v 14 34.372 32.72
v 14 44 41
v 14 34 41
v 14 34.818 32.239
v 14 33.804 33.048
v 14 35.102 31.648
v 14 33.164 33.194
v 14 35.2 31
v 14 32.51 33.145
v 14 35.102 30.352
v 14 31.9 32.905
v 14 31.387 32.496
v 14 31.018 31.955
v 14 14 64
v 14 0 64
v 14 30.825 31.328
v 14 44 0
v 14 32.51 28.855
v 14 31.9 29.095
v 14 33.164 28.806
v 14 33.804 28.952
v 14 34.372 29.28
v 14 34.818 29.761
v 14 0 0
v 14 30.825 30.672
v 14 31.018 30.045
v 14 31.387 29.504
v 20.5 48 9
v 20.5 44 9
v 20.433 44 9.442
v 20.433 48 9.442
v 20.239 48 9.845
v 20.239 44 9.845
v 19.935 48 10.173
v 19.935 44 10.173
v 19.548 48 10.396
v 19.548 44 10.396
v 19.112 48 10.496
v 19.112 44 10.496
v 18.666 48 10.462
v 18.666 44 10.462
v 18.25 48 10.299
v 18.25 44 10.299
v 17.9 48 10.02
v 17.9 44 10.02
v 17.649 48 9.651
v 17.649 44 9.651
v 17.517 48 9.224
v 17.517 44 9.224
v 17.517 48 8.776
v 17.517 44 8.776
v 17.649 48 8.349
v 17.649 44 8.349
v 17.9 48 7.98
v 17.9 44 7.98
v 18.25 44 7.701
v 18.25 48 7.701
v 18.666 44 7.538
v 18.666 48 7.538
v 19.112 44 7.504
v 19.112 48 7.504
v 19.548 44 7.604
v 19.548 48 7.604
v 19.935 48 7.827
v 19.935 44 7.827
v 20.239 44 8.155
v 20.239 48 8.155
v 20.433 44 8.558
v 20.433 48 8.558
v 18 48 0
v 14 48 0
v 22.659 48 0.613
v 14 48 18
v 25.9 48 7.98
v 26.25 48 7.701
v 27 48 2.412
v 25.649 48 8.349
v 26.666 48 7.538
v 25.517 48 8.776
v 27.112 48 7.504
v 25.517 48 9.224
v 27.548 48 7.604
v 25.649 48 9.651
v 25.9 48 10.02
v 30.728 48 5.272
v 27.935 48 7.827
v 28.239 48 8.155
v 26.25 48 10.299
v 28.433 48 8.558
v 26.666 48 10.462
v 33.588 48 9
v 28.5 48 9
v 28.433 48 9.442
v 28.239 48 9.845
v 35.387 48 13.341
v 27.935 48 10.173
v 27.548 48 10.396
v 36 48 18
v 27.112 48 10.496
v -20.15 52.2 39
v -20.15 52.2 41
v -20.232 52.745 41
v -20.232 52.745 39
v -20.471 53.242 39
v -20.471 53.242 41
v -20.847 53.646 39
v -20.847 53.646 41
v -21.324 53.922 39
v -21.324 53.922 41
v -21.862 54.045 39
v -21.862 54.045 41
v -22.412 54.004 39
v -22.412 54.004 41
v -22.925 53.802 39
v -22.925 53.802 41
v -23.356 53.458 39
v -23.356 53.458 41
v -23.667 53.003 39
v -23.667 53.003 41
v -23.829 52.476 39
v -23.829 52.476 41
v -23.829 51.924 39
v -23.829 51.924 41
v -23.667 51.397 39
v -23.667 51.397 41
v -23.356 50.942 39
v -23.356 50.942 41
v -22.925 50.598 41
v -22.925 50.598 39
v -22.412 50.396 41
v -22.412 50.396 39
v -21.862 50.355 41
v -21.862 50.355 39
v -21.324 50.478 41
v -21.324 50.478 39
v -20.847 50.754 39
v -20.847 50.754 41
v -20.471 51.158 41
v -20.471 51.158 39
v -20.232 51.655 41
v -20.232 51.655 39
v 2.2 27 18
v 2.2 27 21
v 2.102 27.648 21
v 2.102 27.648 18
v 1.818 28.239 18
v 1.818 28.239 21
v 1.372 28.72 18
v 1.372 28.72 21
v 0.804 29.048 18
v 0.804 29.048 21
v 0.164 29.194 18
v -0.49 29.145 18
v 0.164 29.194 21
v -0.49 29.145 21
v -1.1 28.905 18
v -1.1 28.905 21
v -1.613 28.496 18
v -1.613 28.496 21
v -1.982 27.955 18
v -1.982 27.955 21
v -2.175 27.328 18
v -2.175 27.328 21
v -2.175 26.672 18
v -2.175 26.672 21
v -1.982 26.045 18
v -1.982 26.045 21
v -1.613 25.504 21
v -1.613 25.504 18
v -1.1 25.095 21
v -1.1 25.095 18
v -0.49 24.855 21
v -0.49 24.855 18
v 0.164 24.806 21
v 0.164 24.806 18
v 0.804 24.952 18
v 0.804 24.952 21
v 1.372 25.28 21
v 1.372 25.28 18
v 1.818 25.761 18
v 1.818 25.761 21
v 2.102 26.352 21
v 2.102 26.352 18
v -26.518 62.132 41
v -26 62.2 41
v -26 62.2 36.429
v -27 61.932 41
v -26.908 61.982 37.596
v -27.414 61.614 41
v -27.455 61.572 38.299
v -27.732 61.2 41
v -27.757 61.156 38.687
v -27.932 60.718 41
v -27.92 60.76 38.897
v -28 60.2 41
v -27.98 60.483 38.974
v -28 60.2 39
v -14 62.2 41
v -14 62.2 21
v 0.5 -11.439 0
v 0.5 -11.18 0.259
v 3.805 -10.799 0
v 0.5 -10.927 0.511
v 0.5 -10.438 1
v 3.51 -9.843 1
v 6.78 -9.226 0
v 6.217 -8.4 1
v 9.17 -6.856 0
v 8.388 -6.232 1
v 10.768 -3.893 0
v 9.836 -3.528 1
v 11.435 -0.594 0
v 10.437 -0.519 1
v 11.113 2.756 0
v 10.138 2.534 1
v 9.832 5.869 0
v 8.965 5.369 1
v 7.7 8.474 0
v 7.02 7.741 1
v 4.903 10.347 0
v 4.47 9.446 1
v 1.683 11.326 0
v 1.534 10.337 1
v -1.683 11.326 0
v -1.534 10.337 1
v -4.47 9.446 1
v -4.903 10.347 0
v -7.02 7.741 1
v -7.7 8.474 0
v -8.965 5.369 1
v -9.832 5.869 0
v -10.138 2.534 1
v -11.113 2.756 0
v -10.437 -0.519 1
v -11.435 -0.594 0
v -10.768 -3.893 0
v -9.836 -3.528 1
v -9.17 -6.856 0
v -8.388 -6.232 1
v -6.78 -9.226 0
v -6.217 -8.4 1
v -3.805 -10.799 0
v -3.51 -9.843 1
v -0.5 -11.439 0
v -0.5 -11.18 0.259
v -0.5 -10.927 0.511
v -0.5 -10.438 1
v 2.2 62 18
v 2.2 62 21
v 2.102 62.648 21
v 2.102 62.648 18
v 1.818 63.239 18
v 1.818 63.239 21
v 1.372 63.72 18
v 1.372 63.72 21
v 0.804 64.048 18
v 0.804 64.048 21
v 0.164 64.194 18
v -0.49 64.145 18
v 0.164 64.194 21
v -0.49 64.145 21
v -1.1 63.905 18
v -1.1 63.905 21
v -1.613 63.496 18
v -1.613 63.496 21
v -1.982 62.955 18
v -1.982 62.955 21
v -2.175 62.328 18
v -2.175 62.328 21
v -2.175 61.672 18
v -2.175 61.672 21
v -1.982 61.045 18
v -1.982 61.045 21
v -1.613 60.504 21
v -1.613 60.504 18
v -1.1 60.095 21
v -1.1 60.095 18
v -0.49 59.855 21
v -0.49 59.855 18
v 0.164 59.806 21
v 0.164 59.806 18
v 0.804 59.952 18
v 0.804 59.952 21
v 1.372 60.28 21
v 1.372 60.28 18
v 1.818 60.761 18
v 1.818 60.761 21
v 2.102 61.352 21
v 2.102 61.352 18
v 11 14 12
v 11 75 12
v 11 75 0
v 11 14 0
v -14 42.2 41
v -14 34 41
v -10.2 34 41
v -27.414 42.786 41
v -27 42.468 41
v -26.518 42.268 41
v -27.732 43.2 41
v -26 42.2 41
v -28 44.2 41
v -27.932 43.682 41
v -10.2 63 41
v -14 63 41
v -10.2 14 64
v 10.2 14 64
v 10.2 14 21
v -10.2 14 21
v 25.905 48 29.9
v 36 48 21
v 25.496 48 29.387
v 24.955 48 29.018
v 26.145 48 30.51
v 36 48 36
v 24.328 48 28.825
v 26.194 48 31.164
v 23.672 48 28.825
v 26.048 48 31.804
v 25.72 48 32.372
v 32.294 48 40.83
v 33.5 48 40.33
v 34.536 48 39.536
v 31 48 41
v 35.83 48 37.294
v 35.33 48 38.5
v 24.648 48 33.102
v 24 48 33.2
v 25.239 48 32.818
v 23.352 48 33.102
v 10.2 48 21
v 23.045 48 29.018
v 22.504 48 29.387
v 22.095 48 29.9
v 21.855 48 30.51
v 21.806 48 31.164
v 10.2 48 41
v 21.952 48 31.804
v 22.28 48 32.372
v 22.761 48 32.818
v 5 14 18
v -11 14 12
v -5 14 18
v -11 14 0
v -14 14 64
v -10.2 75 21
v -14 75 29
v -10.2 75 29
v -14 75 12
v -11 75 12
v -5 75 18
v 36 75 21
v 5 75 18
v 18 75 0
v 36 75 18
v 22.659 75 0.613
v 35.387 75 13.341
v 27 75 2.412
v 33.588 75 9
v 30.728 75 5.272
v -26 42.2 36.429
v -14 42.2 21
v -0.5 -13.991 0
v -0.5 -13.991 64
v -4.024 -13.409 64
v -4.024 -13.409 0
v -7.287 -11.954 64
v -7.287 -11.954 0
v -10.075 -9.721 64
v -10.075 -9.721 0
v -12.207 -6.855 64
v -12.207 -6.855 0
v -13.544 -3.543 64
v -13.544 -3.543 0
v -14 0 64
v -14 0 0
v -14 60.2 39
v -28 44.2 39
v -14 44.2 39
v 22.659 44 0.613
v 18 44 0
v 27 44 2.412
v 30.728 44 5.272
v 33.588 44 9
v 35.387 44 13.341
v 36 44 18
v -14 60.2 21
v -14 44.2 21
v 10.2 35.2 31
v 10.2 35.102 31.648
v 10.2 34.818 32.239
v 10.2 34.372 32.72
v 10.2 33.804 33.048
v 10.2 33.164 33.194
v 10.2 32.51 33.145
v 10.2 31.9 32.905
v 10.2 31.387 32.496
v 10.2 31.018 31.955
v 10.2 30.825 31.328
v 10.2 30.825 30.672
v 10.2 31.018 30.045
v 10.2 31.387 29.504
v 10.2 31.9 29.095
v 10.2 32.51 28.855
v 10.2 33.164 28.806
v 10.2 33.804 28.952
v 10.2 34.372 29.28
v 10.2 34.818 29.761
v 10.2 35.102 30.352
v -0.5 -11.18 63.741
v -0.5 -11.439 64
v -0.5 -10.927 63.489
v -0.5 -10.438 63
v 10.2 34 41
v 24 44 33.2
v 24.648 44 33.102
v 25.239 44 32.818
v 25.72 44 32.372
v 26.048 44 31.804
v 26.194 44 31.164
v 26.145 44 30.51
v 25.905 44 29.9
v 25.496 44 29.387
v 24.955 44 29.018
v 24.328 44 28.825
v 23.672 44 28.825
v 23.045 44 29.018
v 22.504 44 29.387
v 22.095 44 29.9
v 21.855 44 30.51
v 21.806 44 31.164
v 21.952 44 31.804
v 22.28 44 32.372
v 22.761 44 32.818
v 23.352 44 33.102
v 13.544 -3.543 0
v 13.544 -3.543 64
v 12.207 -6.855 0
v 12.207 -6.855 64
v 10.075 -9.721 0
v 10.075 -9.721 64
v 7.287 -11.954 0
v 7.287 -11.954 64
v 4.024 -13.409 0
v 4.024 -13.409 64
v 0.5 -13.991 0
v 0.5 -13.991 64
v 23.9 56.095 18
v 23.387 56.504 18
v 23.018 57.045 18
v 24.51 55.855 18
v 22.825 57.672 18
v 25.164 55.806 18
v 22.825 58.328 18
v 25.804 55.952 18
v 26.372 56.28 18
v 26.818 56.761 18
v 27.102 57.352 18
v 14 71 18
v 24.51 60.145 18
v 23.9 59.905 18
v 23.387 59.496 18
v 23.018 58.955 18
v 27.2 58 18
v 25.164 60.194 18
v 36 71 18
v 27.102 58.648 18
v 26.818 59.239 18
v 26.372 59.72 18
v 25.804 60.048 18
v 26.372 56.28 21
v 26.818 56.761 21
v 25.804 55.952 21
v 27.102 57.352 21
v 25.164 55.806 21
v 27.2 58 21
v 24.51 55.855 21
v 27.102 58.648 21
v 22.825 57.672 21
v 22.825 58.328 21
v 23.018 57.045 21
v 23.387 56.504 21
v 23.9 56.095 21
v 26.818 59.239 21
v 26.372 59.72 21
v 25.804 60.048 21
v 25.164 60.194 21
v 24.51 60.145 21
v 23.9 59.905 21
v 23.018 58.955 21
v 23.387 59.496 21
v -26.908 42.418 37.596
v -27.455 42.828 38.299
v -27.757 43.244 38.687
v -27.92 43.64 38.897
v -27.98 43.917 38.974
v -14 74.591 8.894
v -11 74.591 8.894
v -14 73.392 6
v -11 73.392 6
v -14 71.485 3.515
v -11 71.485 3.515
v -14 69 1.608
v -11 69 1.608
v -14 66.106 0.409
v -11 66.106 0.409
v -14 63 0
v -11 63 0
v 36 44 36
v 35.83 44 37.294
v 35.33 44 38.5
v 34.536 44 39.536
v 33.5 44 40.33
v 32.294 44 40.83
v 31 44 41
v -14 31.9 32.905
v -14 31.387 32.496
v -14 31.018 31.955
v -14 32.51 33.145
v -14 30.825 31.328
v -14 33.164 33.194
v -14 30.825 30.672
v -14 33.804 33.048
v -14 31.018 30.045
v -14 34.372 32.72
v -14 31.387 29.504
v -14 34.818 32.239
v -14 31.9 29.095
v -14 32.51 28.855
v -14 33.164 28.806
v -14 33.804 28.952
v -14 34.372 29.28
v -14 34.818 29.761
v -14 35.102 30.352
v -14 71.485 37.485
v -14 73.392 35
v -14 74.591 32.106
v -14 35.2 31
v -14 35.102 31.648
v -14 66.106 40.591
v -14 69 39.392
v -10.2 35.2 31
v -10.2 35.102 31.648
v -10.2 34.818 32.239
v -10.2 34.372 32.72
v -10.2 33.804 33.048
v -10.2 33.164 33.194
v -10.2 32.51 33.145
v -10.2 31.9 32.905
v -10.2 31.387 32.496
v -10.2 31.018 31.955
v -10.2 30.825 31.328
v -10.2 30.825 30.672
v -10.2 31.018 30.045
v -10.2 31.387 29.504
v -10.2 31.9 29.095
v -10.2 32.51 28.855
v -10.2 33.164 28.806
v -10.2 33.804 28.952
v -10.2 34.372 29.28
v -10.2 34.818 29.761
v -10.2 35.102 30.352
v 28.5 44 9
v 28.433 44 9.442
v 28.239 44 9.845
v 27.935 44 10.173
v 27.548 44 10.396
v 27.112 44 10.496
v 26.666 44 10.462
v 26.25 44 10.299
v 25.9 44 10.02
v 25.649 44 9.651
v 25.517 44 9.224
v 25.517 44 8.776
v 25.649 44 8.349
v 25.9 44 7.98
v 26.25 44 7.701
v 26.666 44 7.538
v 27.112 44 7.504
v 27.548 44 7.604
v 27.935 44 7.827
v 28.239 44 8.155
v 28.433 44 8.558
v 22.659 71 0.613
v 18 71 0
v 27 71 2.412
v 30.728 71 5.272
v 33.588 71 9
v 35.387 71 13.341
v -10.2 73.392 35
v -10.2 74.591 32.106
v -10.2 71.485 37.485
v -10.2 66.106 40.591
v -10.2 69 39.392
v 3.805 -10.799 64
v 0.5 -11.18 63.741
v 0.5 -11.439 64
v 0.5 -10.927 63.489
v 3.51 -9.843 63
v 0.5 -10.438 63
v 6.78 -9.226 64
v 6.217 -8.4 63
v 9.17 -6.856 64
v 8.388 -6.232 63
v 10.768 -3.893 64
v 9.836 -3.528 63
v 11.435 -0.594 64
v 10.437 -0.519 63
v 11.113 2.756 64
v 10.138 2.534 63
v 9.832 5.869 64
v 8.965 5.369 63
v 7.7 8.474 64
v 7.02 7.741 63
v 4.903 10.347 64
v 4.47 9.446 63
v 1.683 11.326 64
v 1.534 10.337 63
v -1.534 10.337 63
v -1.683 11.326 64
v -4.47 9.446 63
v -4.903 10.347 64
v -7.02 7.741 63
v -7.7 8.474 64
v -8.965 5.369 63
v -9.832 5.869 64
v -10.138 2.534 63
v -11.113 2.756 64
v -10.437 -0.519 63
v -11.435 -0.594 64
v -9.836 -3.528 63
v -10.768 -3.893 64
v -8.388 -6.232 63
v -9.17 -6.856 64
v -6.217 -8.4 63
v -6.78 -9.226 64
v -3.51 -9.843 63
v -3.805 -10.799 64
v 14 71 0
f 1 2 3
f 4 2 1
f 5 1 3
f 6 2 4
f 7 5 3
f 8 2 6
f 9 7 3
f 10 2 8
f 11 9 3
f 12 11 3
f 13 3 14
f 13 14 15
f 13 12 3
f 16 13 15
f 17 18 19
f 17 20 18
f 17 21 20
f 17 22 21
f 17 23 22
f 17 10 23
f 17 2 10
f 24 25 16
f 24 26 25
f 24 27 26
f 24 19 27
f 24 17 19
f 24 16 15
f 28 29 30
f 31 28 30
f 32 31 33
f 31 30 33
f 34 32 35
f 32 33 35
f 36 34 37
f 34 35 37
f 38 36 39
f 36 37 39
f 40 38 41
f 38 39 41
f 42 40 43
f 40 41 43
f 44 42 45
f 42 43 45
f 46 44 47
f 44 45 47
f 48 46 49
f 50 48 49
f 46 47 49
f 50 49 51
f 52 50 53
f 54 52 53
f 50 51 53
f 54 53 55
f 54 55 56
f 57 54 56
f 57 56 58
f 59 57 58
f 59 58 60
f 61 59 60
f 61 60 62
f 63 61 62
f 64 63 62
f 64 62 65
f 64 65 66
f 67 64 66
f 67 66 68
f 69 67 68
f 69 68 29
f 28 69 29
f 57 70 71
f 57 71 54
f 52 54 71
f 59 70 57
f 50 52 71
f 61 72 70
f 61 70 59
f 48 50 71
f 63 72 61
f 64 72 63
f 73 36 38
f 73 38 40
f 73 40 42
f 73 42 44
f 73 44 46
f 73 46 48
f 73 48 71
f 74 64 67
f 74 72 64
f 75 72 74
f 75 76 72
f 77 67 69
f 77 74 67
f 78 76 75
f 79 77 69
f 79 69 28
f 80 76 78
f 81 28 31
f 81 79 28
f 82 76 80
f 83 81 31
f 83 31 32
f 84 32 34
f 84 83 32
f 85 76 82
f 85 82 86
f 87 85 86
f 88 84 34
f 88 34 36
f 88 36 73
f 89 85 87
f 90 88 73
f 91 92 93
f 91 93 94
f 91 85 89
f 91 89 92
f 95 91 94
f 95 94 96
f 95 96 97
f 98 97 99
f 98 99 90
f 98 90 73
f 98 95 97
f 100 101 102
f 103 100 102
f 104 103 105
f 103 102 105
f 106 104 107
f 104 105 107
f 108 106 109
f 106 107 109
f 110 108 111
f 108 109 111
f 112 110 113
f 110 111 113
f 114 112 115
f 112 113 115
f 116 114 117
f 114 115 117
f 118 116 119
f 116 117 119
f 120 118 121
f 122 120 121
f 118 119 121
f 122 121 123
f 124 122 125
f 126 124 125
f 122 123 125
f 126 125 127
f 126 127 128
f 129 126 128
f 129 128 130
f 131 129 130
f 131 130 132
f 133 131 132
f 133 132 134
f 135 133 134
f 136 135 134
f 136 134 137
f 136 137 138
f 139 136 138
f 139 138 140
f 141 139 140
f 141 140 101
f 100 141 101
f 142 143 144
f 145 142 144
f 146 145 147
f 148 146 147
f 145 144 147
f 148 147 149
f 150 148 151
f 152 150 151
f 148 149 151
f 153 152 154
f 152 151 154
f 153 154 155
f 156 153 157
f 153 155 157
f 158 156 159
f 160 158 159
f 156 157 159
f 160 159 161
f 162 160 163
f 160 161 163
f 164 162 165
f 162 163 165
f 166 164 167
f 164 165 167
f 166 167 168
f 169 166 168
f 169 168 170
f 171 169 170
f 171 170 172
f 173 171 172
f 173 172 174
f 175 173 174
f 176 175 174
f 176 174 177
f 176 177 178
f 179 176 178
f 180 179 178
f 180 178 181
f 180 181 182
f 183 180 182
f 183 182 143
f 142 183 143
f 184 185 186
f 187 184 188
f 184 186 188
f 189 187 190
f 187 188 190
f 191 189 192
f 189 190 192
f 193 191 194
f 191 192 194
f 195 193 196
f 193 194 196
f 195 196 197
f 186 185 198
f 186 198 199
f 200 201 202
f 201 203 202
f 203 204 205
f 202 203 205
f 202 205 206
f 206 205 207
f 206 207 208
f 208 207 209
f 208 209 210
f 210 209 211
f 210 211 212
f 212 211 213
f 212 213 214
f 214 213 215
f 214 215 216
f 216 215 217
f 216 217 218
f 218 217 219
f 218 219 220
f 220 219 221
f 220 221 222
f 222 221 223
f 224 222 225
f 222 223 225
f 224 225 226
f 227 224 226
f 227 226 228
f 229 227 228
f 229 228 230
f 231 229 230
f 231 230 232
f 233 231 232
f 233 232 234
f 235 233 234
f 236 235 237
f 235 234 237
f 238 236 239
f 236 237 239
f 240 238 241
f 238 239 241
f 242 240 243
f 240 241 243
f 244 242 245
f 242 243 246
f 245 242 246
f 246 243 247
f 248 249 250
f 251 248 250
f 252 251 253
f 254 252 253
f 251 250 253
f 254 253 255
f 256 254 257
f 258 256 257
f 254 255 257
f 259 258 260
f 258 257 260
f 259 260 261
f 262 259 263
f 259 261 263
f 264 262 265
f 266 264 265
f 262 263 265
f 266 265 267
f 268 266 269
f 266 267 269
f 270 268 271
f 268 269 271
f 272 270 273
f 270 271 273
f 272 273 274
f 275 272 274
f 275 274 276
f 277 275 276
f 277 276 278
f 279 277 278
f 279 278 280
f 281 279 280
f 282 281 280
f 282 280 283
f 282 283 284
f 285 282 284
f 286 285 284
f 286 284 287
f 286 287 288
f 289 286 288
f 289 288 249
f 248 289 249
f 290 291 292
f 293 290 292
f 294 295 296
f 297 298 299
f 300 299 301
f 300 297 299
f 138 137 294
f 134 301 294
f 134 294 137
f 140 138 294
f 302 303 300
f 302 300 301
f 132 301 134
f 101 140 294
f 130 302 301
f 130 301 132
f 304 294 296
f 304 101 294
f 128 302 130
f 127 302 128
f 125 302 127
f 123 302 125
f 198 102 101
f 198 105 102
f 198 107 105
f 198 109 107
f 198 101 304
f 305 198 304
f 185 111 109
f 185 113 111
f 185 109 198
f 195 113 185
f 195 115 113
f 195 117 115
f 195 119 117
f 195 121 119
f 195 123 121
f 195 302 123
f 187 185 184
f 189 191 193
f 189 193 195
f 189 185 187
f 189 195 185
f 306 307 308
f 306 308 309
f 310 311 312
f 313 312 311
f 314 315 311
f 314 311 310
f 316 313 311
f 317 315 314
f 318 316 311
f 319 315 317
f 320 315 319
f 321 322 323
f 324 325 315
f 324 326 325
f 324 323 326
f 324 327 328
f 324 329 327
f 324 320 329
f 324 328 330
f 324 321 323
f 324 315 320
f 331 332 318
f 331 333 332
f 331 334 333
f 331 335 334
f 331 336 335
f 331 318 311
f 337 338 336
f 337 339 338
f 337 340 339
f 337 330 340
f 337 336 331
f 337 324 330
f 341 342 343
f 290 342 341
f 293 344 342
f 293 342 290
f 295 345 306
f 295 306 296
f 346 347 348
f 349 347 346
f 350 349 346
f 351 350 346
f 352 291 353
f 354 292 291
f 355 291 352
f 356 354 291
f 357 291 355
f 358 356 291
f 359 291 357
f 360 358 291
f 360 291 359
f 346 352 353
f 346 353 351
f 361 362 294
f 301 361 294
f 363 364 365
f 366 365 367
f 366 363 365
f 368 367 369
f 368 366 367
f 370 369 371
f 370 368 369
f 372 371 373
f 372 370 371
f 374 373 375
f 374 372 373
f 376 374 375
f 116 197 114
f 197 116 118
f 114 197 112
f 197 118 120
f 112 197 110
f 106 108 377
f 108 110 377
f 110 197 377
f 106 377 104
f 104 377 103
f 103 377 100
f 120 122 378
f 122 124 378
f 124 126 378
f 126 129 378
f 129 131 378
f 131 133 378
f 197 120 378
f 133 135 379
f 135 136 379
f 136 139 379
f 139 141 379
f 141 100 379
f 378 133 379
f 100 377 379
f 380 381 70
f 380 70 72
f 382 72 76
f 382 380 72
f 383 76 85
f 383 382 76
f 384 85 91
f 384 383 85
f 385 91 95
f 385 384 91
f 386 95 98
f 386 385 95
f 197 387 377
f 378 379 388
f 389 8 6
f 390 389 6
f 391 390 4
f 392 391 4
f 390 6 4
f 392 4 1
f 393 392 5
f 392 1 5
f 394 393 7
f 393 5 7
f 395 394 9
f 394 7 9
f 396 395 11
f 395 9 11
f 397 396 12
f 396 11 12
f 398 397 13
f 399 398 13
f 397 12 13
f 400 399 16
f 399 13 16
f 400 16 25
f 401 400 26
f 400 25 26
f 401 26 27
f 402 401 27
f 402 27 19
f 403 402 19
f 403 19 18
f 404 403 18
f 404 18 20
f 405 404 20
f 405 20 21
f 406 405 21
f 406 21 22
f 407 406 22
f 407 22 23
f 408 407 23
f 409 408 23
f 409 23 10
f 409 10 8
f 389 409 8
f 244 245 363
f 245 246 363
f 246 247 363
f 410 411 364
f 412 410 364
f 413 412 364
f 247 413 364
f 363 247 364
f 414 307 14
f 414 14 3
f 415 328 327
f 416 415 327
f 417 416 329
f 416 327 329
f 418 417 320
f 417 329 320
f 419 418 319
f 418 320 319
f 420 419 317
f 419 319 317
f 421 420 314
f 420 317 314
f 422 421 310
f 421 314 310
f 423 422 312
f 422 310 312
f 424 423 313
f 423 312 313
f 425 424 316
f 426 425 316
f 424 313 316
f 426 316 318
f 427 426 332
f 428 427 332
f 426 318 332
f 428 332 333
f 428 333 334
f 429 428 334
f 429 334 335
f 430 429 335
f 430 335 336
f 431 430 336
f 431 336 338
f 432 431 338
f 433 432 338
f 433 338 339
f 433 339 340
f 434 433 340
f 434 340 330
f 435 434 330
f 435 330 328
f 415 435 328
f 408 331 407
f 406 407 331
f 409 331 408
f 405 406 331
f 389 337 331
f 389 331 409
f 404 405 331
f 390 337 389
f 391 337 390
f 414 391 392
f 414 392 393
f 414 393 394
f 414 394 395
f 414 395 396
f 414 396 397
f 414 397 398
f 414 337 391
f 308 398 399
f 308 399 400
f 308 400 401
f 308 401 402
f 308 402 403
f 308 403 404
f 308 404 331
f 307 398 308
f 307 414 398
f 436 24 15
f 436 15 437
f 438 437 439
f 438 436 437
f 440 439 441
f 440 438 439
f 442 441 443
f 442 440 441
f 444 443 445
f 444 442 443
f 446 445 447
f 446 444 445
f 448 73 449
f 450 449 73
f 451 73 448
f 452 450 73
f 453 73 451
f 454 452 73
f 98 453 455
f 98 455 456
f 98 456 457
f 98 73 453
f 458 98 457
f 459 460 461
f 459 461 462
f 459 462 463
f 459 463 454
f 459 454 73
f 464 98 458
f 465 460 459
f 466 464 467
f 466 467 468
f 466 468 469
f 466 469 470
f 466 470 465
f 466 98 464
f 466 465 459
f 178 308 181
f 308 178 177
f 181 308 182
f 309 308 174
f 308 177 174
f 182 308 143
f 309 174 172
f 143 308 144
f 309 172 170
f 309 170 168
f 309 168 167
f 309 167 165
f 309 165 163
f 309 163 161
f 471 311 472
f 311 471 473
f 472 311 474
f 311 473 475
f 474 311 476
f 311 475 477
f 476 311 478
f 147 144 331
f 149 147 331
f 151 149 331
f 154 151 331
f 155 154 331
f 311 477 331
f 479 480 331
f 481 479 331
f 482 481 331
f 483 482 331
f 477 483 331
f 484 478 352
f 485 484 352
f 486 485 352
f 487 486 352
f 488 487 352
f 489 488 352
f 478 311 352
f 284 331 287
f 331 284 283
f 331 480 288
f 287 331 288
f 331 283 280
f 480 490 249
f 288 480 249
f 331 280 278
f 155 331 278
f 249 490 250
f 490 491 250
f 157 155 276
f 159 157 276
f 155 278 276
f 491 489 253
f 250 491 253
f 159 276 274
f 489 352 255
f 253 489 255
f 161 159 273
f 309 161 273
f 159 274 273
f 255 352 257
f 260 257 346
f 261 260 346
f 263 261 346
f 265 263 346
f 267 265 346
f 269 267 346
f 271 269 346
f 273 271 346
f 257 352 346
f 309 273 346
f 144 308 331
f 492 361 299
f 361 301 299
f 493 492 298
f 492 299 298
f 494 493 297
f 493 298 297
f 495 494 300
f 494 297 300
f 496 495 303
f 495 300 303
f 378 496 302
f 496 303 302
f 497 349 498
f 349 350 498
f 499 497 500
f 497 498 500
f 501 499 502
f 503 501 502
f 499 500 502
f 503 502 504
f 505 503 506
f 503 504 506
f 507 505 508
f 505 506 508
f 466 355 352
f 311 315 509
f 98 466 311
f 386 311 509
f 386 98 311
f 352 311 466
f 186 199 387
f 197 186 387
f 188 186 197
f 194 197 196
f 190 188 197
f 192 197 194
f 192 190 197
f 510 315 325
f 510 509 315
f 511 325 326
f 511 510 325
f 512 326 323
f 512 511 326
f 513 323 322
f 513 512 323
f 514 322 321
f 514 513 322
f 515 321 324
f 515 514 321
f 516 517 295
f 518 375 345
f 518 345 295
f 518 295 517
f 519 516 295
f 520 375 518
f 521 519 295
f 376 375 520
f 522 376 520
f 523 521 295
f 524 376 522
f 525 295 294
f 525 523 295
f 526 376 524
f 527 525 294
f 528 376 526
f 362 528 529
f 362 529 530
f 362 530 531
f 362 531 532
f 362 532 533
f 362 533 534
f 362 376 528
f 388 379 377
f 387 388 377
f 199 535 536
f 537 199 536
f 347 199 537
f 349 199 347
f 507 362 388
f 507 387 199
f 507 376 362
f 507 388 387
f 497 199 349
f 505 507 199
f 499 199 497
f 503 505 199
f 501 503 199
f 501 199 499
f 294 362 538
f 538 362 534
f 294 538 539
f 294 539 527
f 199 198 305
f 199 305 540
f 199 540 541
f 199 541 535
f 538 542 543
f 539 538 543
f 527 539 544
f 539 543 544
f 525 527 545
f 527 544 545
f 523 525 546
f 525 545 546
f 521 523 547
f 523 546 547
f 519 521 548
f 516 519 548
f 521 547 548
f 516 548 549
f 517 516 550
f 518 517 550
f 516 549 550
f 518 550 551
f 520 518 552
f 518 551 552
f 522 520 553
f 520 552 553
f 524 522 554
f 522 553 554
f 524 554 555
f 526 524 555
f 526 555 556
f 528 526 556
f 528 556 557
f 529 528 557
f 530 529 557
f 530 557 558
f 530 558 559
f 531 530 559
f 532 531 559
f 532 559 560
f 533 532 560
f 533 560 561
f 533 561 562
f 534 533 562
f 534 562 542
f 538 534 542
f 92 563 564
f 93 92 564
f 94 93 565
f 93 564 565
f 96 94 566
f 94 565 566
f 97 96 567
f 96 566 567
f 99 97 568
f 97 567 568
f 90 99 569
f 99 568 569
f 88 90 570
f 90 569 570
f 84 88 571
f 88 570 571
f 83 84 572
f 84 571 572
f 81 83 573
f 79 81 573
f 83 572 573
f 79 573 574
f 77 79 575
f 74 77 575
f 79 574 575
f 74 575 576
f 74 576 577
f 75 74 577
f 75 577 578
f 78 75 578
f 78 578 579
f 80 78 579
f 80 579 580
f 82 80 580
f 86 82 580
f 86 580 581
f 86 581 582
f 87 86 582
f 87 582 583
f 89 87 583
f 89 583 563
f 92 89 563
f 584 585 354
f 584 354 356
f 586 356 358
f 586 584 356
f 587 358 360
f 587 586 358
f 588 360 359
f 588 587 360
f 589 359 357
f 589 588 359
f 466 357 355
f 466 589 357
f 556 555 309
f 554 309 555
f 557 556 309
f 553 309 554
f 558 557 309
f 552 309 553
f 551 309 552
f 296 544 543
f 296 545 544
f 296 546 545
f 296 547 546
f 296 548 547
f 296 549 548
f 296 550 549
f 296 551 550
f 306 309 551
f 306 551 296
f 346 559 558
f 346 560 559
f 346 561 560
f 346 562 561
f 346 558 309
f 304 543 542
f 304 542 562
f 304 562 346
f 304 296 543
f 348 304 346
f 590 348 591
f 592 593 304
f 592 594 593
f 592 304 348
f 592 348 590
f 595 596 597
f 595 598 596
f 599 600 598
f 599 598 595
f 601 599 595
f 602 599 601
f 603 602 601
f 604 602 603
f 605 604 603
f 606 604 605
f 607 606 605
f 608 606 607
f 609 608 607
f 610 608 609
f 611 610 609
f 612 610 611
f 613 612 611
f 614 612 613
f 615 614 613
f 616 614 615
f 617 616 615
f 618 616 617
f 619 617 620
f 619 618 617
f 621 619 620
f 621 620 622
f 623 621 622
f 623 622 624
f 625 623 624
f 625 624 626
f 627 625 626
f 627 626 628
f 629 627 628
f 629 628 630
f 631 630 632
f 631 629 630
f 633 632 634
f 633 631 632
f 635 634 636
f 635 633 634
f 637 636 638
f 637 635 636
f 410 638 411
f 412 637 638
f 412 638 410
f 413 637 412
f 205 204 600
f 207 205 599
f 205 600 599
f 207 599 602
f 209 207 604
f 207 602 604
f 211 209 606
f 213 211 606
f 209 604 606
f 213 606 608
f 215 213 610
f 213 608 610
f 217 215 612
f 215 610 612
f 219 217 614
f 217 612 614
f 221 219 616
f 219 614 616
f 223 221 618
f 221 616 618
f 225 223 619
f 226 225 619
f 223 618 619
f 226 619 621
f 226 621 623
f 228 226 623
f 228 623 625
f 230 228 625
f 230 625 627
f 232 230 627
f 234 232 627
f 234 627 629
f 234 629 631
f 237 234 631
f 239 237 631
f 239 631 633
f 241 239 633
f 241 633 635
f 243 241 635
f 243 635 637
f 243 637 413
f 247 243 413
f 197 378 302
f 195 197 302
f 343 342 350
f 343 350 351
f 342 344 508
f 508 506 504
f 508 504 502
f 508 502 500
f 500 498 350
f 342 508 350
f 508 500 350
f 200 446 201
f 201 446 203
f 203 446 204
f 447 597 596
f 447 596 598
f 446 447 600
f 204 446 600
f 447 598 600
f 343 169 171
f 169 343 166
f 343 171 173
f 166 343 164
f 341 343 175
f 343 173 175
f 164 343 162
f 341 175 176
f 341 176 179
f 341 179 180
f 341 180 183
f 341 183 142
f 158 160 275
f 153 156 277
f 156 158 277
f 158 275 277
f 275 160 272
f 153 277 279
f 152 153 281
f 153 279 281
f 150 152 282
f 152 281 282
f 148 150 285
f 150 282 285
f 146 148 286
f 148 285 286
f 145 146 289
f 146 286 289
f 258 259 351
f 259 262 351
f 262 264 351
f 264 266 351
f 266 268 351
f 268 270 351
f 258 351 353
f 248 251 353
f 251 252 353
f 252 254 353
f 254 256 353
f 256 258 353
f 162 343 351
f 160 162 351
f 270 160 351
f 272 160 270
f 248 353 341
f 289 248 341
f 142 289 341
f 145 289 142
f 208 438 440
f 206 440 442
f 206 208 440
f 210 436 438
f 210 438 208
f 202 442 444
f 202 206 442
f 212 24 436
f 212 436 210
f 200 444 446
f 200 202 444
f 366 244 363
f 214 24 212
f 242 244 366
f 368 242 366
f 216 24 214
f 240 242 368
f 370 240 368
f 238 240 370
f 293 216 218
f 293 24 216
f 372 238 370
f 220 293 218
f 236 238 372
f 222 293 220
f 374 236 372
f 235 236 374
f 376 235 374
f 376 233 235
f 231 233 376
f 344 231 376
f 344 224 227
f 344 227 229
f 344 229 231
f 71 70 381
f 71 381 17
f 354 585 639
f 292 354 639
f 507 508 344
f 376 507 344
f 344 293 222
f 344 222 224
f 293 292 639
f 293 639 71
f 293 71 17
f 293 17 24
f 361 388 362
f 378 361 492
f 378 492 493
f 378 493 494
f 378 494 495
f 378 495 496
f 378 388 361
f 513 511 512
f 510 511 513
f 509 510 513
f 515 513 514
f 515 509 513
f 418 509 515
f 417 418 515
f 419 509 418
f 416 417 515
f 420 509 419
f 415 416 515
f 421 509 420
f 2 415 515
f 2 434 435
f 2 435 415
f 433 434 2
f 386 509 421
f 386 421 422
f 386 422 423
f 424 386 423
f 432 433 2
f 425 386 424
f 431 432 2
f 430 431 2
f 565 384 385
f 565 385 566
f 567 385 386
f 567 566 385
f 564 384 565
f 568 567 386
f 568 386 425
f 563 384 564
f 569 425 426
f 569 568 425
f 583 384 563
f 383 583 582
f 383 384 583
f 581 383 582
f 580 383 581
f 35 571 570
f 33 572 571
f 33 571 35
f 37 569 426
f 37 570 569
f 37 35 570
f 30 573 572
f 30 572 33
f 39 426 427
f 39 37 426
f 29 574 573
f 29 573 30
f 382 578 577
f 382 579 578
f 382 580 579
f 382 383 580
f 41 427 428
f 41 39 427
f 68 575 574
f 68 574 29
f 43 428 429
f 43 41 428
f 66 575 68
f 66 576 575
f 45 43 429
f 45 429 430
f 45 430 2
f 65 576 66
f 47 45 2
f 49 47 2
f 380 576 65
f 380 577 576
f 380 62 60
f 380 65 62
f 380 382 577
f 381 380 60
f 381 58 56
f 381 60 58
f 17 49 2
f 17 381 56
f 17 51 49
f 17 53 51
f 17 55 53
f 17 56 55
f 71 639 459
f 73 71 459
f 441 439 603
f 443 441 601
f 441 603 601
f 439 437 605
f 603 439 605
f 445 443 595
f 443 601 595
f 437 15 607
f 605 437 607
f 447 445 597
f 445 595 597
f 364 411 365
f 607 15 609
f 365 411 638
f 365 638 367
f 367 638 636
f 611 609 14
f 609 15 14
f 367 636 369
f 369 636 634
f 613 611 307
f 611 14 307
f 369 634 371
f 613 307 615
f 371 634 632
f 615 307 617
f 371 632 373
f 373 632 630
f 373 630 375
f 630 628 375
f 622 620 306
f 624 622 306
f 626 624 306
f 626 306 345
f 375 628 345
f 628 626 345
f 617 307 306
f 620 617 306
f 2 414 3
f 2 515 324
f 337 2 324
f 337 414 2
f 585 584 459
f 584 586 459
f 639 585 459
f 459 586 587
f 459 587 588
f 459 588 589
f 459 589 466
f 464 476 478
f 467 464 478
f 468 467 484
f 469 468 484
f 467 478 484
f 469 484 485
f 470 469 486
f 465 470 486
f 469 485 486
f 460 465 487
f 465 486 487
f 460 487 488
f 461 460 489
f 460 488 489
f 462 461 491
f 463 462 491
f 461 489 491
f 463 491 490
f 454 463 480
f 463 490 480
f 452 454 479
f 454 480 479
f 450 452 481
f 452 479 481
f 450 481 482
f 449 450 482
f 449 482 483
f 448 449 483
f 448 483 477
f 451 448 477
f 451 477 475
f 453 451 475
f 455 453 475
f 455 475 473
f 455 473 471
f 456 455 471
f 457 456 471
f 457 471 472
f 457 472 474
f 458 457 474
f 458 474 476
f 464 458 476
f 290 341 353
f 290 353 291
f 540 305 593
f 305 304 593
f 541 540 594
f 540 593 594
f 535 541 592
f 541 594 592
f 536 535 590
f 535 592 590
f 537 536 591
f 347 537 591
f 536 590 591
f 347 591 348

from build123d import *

# Parameters (mm, degrees)
BOSS_EXTRUDE1_DEPTH     = 64
CUT_EXTRUDE1_DEPTH      = 61
CUT_EXTRUDE2_DEPTH      = 103.493902258
CUT_EXTRUDE2_DEPTH_BACK = 103.493902258
CUT_EXTRUDE3_DEPTH      = 43
CUT_EXTRUDE4_DEPTH      = 105.961897849
CHAMFER1_SIZE           = 1
SKETCH6_R               = 2.2
CUT_EXTRUDE5_DEPTH      = 94.648278148
BOSS_EXTRUDE2_DEPTH     = 14
CUT_EXTRUDE6_DEPTH      = 106.81625079
SKETCH9_R               = 1.85
CUT_EXTRUDE7_DEPTH      = 93.746967605
FILLET1_R               = 2
FILLET2_R               = 12
SKETCH10_R              = 2.2
CUT_EXTRUDE8_DEPTH      = 108.168092266
FILLET3_R               = 5
FILLET4_START           = 44
FILLET4_DEPTH           = 31
SKETCH11_R              = 2.2
CUT_EXTRUDE9_DEPTH      = 97.098348533
SKETCH12_W              = 18
SKETCH12_H              = 23
CUT_EXTRUDE10_DEPTH     = 22
CUT_EXTRUDE11_REACH     = 95.568
SKETCH13_R              = 1.500000659
SKETCH13_R_2            = 1.499999352


with BuildPart() as part:
    # Sketch1 → Boss-Extrude1 (new body)
    with BuildSketch(Plane.XY):
        with BuildLine():
            Line((-14, 0), (-14, 75))
            Line((-14, 75), (36, 75))
            Line((36, 75), (36, 44))
            Line((36, 44), (14, 44))
            Line((14, 44), (14, 0))
            ThreePointArc((14, 0), (0, -14), (-14, 0))
        make_face()
    extrude(amount=BOSS_EXTRUDE1_DEPTH)

    # Sketch2 → Cut-Extrude1 (cut)
    with BuildSketch(Plane(origin=(0, 75, 0), x_dir=(1, 0, 0), z_dir=(0, 1, 0))):
        Polygon((-11, 0), (-11, -12), (-5, -18), (5, -18), (11, -12), (11, 0), align=None)
    extrude(amount=-CUT_EXTRUDE1_DEPTH, mode=Mode.SUBTRACT)

    # Sketch3 → Cut-Extrude2 (cut, two sides: drawn at the far end of the back side and taken through both)
    with BuildSketch(Plane(origin=(14, 0, 0), x_dir=(0, 0, -1), z_dir=(1, 0, 0)).offset(-CUT_EXTRUDE2_DEPTH_BACK)):
        Polygon((-64, 14), (-41, 34), (-41, 75), (-64, 75), align=None)
    extrude(amount=CUT_EXTRUDE2_DEPTH + CUT_EXTRUDE2_DEPTH_BACK, mode=Mode.SUBTRACT)

    # Sketch4 → Cut-Extrude3 (cut)
    with BuildSketch(Plane.XY.offset(64)):
        Polygon((-10.2, 14), (-10.2, 75), (36, 75), (36, 48), (10.2, 48), (10.2, 14), align=None)
    extrude(amount=-CUT_EXTRUDE3_DEPTH, mode=Mode.SUBTRACT)

    # Sketch5 → Cut-Extrude4 (cut, through all)
    with BuildSketch(Plane.XY.offset(64)):
        with BuildLine():
            Line((-0.5, -10.438031424), (-0.5, -13.99106858))
            ThreePointArc((-0.5, -13.99106858), (0, -14), (0.5, -13.99106858))
            Line((0.5, -13.99106858), (0.5, -10.438031424))
            ThreePointArc((0.5, -10.438031424), (0, 10.45), (-0.5, -10.438031424))
        make_face()
    extrude(amount=-CUT_EXTRUDE4_DEPTH, mode=Mode.SUBTRACT)

    # Chamfer1
    chamfer1_edges = [part.edges().sort_by_distance(p)[0] for p in [
        (0, 10.45, 0),
        (0, 10.45, 64),
    ]]
    chamfer(chamfer1_edges, length=CHAMFER1_SIZE)

    # Sketch6 → Cut-Extrude5 (cut, through all)
    with BuildSketch(Plane.XY.offset(21)):
        with Locations((0, 62)):
            Circle(SKETCH6_R)
        with Locations((0, 27)):
            Circle(SKETCH6_R)
        with Locations((25, 58)):
            Circle(SKETCH6_R)
    extrude(amount=-CUT_EXTRUDE5_DEPTH, mode=Mode.SUBTRACT)

    # Sketch7 → Boss-Extrude2 (add)
    with BuildSketch(Plane(origin=(-14, 0, 0), x_dir=(0, 0, -1), z_dir=(1, 0, 0))):
        Polygon((-41, 62.2), (-21, 62.2), (-21, 60.2), (-39, 60.2), (-39, 44.2), (-21, 44.2), (-21, 42.2), (-41, 42.2), align=None)
    extrude(amount=-BOSS_EXTRUDE2_DEPTH)

    # Sketch8 → Cut-Extrude6 (cut, through all)
    with BuildSketch(Plane(origin=(0, 62.2, 0), x_dir=(1, 0, 0), z_dir=(0, 1, 0))):
        Polygon((-14, -21), (-28, -39), (-28, -21), align=None)
    extrude(amount=-CUT_EXTRUDE6_DEPTH, mode=Mode.SUBTRACT)

    # Sketch9 → Cut-Extrude7 (cut, through all)
    with BuildSketch(Plane.XY.offset(41)):
        with Locations((-22, 52.2)):
            Circle(SKETCH9_R)
    extrude(amount=-CUT_EXTRUDE7_DEPTH, mode=Mode.SUBTRACT)

    # Fillet1
    fillet1_edges = [part.edges().sort_by_distance(p)[0] for p in [
        (-28, 42.2, 40),
        (-28, 62.2, 40),
    ]]
    fillet(fillet1_edges, radius=FILLET1_R)

    # Fillet2
    fillet2_edges = [part.edges().sort_by_distance(p)[0] for p in [
        (-12.5, 75, 0),
        (-12.1, 75, 41),
    ]]
    fillet(fillet2_edges, radius=FILLET2_R)

    # Sketch10 → Cut-Extrude8 (cut, through all)
    with BuildSketch(Plane(origin=(14, 0, 0), x_dir=(0, 0, -1), z_dir=(1, 0, 0))):
        with Locations(Location((-31, 33, 0), (0, 0, 90))):
            Circle(SKETCH10_R)
    extrude(amount=-CUT_EXTRUDE8_DEPTH, mode=Mode.SUBTRACT)

    # Fillet3
    fillet3_edges = [part.edges().sort_by_distance(p)[0] for p in [
        (36, 46, 41),
    ]]
    fillet(fillet3_edges, radius=FILLET3_R)

    # Fillet4: read off the stored shape, not the designer's step
    # Fillet4 outline → Fillet4 (cut)
    with BuildSketch(Plane(origin=(0, 0, 0), x_dir=(1, 0, 0), z_dir=(0, 1, 0)).offset(FILLET4_START)):
        with BuildLine():
            ThreePointArc((18, 0), (30.727922061, -5.272077939), (36, -18))
            Line((36, -18), (36, 0))
            Line((36, 0), (18, 0))
        make_face()
    extrude(amount=FILLET4_DEPTH, mode=Mode.SUBTRACT)

    # Sketch11 → Cut-Extrude9 (cut, through all)
    with BuildSketch(Plane(origin=(0, 48, 0), x_dir=(1, 0, 0), z_dir=(0, 1, 0))):
        with Locations(Location((24, -31, 0), (0, 0, 270))):
            Circle(SKETCH11_R)
    extrude(amount=-CUT_EXTRUDE9_DEPTH, mode=Mode.SUBTRACT)

    # Sketch12 → Cut-Extrude10 (cut)
    with BuildSketch(Plane.ZY.offset(-36)):
        with Locations((9, 59.5)):
            Rectangle(SKETCH12_W, SKETCH12_H)
    extrude(amount=CUT_EXTRUDE10_DEPTH, mode=Mode.SUBTRACT)

    # Sketch13 → Cut-Extrude11 (cut, up to next)
    with BuildSketch(Plane.XZ.offset(-44), mode=Mode.PRIVATE) as cut_extrude11_sk1:
        with Locations((19.000002521, 8.999996593)):
            Circle(SKETCH13_R)
    cut_extrude11_tool1 = extrude(cut_extrude11_sk1.sketch, amount=-CUT_EXTRUDE11_REACH, mode=Mode.PRIVATE) & part.part
    # Sketch13 → Cut-Extrude11 (cut, up to next)
    with BuildSketch(Plane.XZ.offset(-44), mode=Mode.PRIVATE) as cut_extrude11_sk2:
        with Locations((27.000001248, 8.999995496)):
            Circle(SKETCH13_R_2)
    cut_extrude11_tool2 = extrude(cut_extrude11_sk2.sketch, amount=-CUT_EXTRUDE11_REACH, mode=Mode.PRIVATE) & part.part
    add(cut_extrude11_tool1.solids().sort_by_distance((19.000003, 44, 8.999997))[0], mode=Mode.SUBTRACT)
    add(cut_extrude11_tool2.solids().sort_by_distance((27.000001, 44, 8.999995))[0], mode=Mode.SUBTRACT)


solid = part.part
